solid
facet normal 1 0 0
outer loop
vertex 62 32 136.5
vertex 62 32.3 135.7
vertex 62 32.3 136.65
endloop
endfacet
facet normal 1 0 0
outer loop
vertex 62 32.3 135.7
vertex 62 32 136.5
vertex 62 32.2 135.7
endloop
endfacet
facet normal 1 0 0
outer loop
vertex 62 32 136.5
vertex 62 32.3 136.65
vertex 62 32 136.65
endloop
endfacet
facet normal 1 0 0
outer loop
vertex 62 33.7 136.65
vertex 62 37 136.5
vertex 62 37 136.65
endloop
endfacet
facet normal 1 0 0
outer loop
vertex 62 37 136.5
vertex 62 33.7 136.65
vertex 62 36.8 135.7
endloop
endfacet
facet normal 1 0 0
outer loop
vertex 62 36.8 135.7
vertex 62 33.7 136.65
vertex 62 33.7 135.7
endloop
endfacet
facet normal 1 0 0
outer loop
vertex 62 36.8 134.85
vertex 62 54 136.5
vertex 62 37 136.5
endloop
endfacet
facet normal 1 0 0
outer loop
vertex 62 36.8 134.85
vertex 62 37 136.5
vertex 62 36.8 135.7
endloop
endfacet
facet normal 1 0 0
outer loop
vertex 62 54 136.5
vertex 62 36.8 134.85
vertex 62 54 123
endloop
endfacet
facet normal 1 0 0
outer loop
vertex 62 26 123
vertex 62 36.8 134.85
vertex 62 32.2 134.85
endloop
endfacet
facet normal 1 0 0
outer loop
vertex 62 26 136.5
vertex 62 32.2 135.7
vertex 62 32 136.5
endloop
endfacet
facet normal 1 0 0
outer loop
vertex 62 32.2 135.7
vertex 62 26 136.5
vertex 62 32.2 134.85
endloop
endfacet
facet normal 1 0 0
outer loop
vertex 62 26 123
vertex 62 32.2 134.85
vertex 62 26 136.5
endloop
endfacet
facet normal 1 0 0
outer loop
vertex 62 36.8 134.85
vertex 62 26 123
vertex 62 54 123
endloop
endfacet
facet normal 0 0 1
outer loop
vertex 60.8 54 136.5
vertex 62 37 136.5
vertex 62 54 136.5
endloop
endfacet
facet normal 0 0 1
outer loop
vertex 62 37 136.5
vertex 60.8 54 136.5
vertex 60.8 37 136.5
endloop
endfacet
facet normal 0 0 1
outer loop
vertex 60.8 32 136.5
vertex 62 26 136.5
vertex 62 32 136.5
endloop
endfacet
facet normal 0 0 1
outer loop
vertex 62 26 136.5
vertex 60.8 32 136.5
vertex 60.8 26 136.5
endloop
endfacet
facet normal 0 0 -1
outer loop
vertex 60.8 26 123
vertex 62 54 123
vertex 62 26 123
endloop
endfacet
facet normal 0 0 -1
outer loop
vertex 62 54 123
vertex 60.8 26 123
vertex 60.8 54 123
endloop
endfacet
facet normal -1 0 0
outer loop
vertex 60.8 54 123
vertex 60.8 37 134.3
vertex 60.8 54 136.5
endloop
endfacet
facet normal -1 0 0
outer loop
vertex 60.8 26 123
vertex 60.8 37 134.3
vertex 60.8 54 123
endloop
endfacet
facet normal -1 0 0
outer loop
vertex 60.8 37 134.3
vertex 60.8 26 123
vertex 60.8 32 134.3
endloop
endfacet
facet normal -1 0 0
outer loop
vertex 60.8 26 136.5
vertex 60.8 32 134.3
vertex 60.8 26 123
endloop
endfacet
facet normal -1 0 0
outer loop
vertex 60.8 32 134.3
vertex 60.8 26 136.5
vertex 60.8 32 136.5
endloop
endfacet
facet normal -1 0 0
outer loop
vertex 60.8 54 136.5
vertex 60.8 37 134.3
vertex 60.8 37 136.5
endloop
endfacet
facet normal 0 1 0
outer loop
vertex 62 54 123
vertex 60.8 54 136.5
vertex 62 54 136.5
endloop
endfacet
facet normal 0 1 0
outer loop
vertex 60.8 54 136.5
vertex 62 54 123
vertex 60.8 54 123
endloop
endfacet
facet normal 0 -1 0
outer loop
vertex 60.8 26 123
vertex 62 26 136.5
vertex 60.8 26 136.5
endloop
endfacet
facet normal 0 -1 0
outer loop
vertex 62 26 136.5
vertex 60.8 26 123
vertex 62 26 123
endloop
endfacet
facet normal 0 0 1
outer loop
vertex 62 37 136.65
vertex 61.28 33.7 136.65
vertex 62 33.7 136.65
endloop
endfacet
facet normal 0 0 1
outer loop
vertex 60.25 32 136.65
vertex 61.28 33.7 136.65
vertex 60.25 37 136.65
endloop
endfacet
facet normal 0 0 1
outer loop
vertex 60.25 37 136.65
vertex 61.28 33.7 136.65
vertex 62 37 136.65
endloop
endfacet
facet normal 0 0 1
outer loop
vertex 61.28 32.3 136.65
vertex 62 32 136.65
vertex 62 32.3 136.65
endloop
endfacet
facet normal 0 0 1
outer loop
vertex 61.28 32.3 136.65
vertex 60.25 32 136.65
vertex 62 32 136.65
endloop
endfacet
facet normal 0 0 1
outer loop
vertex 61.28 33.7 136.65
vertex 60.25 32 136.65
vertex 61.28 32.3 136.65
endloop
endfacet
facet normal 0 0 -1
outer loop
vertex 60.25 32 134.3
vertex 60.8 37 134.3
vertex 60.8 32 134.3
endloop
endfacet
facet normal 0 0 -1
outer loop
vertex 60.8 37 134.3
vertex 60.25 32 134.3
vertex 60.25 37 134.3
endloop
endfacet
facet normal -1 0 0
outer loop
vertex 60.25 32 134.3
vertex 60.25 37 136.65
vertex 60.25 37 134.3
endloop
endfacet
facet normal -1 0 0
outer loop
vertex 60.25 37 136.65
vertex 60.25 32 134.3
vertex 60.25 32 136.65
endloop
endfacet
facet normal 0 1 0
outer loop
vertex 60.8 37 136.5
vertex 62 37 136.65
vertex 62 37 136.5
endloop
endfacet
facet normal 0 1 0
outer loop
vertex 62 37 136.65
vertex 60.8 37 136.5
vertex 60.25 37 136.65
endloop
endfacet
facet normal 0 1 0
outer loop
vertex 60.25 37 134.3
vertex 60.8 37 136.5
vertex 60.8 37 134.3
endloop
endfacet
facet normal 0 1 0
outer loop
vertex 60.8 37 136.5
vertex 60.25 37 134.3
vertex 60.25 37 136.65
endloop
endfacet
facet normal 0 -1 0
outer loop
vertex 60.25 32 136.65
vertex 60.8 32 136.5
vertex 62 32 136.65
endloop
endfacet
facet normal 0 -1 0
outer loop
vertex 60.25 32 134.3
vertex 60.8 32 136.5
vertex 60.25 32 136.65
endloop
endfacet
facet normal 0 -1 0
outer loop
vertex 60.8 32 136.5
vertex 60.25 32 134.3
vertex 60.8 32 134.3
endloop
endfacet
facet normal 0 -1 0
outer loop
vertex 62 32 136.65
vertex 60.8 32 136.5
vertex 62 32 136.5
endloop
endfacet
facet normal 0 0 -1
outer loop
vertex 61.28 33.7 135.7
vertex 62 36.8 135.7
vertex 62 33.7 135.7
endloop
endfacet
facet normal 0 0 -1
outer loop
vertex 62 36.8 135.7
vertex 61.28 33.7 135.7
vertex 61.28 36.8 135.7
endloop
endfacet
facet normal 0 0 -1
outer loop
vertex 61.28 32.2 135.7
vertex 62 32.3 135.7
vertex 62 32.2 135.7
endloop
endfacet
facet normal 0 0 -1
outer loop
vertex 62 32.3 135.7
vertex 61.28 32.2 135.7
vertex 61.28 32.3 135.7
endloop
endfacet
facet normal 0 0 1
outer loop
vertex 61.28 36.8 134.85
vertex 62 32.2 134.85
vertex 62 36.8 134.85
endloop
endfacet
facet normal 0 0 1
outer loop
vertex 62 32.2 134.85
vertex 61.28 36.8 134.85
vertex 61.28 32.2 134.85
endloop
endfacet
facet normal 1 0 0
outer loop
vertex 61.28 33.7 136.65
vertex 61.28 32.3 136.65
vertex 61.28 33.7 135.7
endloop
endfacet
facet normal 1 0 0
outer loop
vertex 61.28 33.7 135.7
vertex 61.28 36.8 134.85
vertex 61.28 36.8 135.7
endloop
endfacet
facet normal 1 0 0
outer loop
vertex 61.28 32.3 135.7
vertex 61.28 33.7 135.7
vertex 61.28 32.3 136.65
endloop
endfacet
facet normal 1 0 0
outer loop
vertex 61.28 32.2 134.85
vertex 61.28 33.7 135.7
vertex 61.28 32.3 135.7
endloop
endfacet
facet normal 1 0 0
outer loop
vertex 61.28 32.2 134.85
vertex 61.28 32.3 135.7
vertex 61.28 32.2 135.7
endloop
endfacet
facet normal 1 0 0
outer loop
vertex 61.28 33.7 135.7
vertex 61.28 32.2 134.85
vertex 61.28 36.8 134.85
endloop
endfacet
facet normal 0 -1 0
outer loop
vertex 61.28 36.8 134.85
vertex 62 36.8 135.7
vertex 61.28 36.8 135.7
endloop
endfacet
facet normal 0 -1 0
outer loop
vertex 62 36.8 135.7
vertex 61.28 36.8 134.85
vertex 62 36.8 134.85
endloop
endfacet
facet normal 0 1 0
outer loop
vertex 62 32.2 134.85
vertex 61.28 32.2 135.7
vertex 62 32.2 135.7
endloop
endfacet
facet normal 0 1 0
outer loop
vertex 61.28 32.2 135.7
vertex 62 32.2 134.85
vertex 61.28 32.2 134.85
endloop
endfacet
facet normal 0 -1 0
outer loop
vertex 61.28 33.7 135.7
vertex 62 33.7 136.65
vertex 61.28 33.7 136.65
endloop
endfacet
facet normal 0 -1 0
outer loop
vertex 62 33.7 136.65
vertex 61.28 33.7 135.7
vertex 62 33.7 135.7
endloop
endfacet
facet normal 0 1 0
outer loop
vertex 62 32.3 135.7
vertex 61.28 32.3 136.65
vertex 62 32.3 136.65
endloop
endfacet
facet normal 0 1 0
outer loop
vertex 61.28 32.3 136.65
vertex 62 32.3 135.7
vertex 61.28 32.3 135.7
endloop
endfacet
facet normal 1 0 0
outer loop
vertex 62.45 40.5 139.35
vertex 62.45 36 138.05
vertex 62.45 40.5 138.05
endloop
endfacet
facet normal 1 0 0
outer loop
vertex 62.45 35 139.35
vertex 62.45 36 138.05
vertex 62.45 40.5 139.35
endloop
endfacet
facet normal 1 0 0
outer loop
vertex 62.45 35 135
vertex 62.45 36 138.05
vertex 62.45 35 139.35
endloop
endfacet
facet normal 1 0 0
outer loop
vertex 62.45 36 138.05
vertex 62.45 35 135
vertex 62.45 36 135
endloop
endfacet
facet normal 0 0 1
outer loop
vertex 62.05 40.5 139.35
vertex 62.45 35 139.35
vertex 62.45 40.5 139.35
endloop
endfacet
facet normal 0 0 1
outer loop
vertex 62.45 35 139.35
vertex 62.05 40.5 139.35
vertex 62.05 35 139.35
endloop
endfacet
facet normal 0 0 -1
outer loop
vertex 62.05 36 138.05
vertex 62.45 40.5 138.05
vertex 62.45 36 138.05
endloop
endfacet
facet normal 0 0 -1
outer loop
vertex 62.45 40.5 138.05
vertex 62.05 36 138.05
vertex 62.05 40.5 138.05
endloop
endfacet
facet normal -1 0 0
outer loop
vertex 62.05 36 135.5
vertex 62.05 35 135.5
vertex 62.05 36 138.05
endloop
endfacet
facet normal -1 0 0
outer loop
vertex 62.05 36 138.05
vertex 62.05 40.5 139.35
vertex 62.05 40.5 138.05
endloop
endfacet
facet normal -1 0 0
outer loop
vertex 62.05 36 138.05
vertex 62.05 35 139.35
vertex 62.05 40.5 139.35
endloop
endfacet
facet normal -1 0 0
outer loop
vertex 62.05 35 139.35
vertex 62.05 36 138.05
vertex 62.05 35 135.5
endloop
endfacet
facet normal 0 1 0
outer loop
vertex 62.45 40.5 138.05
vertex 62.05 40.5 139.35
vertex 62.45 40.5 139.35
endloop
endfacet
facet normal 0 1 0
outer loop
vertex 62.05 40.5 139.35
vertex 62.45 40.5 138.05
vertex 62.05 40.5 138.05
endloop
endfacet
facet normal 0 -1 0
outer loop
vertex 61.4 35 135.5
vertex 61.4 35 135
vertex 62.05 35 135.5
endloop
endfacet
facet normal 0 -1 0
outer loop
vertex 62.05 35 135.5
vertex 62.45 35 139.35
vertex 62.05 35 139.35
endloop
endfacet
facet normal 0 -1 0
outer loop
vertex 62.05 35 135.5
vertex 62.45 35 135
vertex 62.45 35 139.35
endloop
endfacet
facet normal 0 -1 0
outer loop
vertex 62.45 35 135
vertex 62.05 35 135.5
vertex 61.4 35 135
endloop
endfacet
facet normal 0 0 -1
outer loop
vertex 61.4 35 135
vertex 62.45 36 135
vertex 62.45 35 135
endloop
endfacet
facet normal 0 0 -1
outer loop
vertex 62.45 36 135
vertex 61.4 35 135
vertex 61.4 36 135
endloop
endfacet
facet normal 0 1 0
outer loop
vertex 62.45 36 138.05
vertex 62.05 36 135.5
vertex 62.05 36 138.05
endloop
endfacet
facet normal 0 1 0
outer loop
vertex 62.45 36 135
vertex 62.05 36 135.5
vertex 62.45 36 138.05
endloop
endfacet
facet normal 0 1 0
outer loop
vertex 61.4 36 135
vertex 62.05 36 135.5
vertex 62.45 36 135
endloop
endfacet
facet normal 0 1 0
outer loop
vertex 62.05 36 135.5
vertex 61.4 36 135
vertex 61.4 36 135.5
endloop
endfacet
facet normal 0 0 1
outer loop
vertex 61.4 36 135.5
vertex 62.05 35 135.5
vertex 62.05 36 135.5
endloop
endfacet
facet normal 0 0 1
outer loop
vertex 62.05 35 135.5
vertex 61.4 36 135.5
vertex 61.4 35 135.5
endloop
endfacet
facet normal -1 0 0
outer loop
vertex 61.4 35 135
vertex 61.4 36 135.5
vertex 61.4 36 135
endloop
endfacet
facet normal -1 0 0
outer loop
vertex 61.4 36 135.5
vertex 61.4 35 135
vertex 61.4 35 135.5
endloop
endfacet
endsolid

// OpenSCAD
// Forest Guardian G1 positive bayonet: native 3D reference only.
// Unit coupon MUST NOT be printed for product use. No anti-backslide keeper.
$fn=36; lock_state="locked"; SHIFT_Y=2.5;
module guide(){difference(){union(){
 translate([60.8,26,123])cube([1.2,28,13.5]);
 translate([60.25,32,134.3])cube([1.75,5,2.35]);}
 translate([61.28,32.2,134.85])cube([.87,4.6,.85]);
 translate([61.28,32.3,135.70])cube([.87,1.4,1.05]);
}}
module key(){translate([0,lock_state=="locked"?SHIFT_Y:0,0])union(){
 translate([62.05,32.5,138.05])cube([.4,5.5,1.3]);
 translate([62.05,32.5,135])cube([.4,1,4.35]);
 translate([61.4,32.5,135])cube([1.05,1,.5]);}}
color([.10,.50,.60])guide();
color([.82,.30,.70])key();
